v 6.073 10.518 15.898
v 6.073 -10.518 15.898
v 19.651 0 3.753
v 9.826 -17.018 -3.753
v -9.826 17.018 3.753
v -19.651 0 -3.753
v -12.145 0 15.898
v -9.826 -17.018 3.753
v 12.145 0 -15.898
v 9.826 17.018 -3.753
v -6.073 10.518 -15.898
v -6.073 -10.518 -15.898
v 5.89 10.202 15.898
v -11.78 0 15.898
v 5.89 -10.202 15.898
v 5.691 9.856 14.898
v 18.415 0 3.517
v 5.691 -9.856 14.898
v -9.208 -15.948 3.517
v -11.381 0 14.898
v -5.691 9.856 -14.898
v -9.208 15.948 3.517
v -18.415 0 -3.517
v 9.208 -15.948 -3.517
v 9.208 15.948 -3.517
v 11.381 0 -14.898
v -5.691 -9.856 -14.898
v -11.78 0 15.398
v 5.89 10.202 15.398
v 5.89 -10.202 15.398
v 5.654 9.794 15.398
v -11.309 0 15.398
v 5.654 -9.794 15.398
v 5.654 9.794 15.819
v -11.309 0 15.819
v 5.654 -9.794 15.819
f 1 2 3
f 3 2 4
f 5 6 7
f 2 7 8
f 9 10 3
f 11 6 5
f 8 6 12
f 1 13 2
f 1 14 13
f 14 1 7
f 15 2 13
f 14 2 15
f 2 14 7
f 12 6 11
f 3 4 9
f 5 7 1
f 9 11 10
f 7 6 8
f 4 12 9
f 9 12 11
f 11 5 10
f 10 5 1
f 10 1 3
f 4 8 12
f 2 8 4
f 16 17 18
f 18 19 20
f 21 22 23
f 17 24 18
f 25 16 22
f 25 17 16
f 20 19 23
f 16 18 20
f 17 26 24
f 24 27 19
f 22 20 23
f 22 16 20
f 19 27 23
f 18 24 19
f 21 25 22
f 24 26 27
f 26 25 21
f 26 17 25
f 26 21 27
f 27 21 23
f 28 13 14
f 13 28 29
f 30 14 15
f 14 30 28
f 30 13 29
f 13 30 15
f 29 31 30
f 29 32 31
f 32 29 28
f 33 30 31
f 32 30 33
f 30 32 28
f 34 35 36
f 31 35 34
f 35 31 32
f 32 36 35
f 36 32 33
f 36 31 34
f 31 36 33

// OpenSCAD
arete = 21.036;
angle = 20.905;
paroi = 1;
echelleReductionAjustementBouchon = 0.96;
r = 0.19; // résolution d'impression sur l'axe Z
ico_sch = [3,5];
Cpi = 3.14159;
Cphi = (1+sqrt(5))/2;
Cepsilon = 0.00000001;

function ico_ext_radius(a) = 
    a*1/4*(sqrt(10+2*sqrt(5)));
    
function ico_int_radius(a) = 
    a/12*(3*sqrt(3)+sqrt(15));
    
function ico_arete_from(int_radius) = 
    int_radius*12/(3*sqrt(3)+sqrt(15));
    
externalRadius = ico_ext_radius(arete);
internalRadius = ico_ext_radius( 
                    ico_arete_from(
                        ico_int_radius(arete)-paroi));
                        
echo(externalRadius); 
echo(internalRadius);

//ico_creux();
//decoupe_bouchon();
corps_ouvert();
bouchon();
//trou();

module corps_ouvert() {
    //rotate([180, 0, 0])
	difference() {
		ico_creux();
		decoupe_bouchon();
	}
}

module bouchon() {
//    rotate([180, 0, 0])
	scale([echelleReductionAjustementBouchon, echelleReductionAjustementBouchon, 0.995])
	difference () {
        intersection() {
            ico_creux();
            decoupe_bouchon(echelleReductionAjustementBouchon);
        }
        // trou centre face
//		translate([0, 0, externalRadius*0.5])
//		cylinder(30, r=diametreTrouBouchon/2, $fn=22);
	}
}

module trou() {
    rotate([0, -37.3, 0])
		translate([0, 0, externalRadius*0.5])
		cylinder(30, r=diametreTrouBouchon/2, $fn=22);
}

module ico_creux() {
	difference() {
        rotate([0, angle, 0]) icosahedron(externalRadius);
        rotate([0, angle, 0]) icosahedron(internalRadius);
	}
}

module decoupe_bouchon(scale=1) {
    distance = ico_int_radius(arete);
	rotate([0,0,60]) translate([0, 0, distance])
		cylinder(paroi, r=arete*0.56, $fn=3, center=true);
//	rotate([0,0,60]) translate([0, 0, distance-paroi])
//		cylinder(paroi, r=(arete-paroi)*0.57, $fn=3, center=true);
}

module icosahedron(rad=1) {
	Cphi = (1+sqrt(5))/2;

	// Convert spherical to cartesian
	function sph_to_cart(c, rad) = [
		rad*sin(atan2(sqrt(c[0]*c[0]+c[1]*c[1]), c[2]))*cos(atan2(c[1],c[0])),  
		rad*sin(atan2(sqrt(c[0]*c[0]+c[1]*c[1]), c[2]))*sin(atan2(c[1],c[0])),
		rad*cos(atan2(sqrt(c[0]*c[0]+c[1]*c[1]), c[2]))
		];


	//================================================
	//	Icosahedron
	//================================================
	//
	// (0, +-1, +-Cphi)
	// (+-Cphi, 0, +-1)
	// (+-1, +-Cphi, 0)

	function icosa_unit(rad) = [
		sph_to_cart([0, +1, +Cphi], rad), 
		sph_to_cart([0, +1, -Cphi], rad),
		sph_to_cart([0, -1, -Cphi], rad),
		sph_to_cart([0, -1, +Cphi], rad),
		sph_to_cart([+Cphi, 0, +1], rad), 
		sph_to_cart([+Cphi, 0, -1], rad), 
		sph_to_cart([-Cphi, 0, -1], rad),
		sph_to_cart([-Cphi, 0, +1], rad),
		sph_to_cart([+1, +Cphi, 0], rad),
		sph_to_cart([+1, -Cphi, 0], rad), 
		sph_to_cart([-1, -Cphi, 0], rad), 
		sph_to_cart([-1, +Cphi, 0], rad),
		];

	icosa_faces = [ 
		[3,0,4],
		[3,4,9],
		[3,9,10],
		[3,10,7],
		[3,7,0],
		[0,8,4],
		[0,7,11],
		[0,11,8],
		[4,8,5],
		[4,5,9],
		[7,10,6],
		[7,6,11],
		[9,5,2],
		[9,2,10],
		[2,6,10],
		[1,5,8],
		[1,8,11],
		[1,11,6],
		[5,1,2],
		[2,1,6]
		];

	polyhedron(icosa_unit(rad), faces = icosa_faces);
}
